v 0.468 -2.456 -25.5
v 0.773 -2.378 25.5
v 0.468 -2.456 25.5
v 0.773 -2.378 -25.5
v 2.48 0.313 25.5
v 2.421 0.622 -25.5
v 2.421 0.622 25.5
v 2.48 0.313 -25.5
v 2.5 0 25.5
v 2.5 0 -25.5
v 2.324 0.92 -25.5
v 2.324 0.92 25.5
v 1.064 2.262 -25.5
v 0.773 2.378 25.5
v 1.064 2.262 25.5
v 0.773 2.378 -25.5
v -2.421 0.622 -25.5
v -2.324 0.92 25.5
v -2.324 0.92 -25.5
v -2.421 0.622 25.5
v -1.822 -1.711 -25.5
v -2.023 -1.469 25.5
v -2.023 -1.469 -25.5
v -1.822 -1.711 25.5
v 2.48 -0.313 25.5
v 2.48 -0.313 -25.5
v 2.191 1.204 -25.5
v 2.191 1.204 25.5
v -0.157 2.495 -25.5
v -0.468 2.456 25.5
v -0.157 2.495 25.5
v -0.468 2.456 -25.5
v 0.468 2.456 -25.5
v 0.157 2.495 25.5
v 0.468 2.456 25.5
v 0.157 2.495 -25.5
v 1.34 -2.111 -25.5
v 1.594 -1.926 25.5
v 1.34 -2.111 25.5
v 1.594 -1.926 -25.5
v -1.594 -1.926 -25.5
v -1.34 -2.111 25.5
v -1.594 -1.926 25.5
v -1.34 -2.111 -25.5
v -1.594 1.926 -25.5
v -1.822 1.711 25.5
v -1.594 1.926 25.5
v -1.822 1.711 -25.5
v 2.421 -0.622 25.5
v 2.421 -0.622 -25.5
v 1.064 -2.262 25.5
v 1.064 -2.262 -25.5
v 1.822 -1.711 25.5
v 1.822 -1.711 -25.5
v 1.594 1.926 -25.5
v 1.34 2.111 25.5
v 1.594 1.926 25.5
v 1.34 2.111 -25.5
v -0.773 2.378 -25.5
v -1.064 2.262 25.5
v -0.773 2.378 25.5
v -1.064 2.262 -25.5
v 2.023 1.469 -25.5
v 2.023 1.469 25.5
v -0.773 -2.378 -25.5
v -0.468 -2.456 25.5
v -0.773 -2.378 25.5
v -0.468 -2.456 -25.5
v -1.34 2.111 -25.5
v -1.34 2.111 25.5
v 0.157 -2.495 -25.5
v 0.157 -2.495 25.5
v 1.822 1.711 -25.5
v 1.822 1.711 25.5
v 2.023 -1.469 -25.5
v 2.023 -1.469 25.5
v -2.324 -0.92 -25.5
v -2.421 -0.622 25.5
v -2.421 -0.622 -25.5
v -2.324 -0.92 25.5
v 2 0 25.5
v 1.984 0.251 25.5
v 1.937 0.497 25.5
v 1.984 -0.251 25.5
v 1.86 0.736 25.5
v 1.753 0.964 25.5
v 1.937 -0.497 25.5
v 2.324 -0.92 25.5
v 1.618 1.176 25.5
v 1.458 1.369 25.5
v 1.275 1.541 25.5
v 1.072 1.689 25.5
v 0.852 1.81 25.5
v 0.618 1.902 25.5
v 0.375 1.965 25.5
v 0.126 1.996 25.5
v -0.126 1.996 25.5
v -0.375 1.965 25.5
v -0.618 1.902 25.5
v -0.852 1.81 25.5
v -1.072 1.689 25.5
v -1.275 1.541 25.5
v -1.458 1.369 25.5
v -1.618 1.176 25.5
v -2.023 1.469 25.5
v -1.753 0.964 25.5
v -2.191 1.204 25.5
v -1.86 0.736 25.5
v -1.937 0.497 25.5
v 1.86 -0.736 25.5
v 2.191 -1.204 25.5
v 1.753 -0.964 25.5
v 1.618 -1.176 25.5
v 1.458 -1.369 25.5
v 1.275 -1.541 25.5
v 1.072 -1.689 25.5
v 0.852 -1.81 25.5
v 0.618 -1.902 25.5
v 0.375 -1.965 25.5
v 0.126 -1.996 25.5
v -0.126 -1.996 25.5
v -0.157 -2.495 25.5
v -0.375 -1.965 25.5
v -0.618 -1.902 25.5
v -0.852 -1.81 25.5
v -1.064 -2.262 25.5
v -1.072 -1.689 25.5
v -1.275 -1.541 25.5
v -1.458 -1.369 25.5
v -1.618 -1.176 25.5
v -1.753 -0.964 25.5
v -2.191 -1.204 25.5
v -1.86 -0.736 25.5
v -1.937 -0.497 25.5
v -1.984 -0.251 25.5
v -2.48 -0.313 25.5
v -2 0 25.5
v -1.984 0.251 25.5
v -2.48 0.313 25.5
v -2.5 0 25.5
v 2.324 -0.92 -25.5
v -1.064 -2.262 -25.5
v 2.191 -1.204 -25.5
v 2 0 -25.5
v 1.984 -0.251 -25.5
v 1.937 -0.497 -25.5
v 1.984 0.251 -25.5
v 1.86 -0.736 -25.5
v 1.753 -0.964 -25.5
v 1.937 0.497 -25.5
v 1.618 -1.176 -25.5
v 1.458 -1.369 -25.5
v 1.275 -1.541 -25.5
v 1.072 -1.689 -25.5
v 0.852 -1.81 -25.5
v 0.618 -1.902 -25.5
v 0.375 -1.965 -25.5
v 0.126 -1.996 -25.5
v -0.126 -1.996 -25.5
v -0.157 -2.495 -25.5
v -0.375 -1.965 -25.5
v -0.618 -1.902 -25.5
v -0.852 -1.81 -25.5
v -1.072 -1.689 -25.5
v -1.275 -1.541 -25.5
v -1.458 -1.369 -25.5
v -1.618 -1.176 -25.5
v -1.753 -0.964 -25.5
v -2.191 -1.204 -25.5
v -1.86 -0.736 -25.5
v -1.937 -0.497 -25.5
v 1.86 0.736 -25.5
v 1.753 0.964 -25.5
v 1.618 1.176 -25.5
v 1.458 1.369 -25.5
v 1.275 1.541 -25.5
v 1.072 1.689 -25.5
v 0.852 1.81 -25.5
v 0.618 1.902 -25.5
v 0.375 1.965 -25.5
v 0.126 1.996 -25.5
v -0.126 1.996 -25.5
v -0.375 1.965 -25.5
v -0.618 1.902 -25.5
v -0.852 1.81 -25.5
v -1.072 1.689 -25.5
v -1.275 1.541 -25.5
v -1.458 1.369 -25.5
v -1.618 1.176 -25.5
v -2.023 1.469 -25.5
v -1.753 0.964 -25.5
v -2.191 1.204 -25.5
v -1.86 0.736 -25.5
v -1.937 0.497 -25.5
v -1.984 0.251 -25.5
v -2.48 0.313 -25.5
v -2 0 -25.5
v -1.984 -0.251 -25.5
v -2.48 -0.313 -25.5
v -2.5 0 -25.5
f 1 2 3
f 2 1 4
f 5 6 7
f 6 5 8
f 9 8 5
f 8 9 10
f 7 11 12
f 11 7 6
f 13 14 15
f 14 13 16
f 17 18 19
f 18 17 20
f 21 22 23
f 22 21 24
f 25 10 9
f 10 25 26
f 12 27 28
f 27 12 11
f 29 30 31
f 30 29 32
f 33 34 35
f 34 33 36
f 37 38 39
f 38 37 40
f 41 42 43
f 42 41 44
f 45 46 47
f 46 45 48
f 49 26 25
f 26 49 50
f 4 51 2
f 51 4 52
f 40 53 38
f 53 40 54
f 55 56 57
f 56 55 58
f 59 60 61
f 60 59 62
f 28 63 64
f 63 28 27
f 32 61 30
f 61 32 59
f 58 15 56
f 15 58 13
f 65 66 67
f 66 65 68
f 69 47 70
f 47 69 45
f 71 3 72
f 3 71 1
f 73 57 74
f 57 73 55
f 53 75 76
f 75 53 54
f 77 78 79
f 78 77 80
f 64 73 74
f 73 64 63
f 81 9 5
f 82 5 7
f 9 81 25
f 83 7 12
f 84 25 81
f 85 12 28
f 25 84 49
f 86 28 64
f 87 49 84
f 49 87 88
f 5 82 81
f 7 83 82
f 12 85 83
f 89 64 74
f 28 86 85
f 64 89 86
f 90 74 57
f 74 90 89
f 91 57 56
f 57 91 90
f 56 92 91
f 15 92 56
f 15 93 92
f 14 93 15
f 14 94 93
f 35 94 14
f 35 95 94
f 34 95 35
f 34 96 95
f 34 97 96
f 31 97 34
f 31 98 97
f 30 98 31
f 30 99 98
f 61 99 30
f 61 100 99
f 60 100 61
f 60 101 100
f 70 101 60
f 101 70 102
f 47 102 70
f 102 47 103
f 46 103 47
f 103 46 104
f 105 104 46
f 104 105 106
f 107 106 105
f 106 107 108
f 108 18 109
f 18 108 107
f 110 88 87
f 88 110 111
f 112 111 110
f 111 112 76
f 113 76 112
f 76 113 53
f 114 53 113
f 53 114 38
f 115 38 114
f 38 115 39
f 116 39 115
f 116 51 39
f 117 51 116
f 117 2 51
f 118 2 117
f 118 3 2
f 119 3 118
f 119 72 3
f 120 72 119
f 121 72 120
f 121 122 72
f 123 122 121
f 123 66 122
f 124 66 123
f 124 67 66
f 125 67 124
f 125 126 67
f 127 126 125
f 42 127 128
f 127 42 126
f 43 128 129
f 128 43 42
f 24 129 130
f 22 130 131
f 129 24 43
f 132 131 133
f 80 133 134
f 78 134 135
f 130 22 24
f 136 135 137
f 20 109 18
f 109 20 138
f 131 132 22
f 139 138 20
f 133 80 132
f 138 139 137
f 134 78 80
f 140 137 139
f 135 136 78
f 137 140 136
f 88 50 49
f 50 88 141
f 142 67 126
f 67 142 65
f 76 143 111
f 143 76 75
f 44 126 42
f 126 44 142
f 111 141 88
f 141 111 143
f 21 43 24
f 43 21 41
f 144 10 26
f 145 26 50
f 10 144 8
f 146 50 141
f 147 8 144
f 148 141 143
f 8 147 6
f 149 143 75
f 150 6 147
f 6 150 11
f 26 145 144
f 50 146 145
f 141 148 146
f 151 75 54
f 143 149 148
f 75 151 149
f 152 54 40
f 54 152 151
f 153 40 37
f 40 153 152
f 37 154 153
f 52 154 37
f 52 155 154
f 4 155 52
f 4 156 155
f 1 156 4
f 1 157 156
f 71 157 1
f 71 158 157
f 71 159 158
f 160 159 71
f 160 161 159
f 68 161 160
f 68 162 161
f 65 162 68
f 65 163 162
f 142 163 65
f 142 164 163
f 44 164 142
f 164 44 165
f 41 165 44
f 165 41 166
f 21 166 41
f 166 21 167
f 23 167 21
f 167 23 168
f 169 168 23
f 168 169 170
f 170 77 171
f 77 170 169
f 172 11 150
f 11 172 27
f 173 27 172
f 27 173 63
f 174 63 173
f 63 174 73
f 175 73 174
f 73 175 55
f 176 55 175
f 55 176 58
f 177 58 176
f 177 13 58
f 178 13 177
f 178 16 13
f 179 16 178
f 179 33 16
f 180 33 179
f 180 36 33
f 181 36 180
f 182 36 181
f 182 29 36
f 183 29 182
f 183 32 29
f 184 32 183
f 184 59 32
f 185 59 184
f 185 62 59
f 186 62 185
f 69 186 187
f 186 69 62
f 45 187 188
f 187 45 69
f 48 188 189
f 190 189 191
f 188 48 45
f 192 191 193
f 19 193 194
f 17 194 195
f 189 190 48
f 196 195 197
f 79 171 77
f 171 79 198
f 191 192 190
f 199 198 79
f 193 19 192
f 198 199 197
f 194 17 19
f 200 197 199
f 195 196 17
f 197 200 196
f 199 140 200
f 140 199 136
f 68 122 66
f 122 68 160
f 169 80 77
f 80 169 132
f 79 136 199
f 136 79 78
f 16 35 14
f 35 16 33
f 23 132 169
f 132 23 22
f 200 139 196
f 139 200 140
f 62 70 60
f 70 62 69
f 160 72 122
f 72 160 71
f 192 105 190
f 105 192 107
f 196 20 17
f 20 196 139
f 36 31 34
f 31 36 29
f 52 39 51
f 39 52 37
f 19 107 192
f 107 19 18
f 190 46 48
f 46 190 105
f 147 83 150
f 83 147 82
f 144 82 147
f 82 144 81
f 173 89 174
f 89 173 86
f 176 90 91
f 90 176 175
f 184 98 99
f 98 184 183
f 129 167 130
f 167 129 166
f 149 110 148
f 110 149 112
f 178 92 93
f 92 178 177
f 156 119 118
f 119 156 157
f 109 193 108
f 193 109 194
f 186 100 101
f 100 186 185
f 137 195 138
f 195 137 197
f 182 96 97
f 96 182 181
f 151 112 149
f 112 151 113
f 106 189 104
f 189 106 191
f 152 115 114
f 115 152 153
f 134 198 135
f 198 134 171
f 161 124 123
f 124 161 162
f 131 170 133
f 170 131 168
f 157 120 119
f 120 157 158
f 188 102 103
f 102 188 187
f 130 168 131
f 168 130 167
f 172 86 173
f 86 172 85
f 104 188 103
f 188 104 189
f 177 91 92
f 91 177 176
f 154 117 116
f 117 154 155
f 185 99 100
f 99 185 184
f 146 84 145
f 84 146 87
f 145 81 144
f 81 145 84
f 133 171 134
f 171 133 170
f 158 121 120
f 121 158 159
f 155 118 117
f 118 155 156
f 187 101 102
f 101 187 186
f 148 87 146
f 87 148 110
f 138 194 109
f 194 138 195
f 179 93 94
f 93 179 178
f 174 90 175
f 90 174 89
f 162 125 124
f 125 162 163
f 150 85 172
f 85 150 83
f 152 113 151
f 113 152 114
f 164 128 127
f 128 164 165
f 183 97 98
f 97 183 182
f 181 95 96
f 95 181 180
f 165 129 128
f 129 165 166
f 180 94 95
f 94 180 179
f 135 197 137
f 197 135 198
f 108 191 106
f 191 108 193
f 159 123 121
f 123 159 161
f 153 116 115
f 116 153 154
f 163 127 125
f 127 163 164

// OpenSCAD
$fn = 50;


difference() {
	union() {
		translate(v = [0, 0, -25.5000000000]) {
			cylinder(h = 51, r = 2.5000000000);
		}
	}
	union() {
		translate(v = [0, 0, -100.0000000000]) {
			cylinder(h = 200, r = 2.0000000000);
		}
	}
}
